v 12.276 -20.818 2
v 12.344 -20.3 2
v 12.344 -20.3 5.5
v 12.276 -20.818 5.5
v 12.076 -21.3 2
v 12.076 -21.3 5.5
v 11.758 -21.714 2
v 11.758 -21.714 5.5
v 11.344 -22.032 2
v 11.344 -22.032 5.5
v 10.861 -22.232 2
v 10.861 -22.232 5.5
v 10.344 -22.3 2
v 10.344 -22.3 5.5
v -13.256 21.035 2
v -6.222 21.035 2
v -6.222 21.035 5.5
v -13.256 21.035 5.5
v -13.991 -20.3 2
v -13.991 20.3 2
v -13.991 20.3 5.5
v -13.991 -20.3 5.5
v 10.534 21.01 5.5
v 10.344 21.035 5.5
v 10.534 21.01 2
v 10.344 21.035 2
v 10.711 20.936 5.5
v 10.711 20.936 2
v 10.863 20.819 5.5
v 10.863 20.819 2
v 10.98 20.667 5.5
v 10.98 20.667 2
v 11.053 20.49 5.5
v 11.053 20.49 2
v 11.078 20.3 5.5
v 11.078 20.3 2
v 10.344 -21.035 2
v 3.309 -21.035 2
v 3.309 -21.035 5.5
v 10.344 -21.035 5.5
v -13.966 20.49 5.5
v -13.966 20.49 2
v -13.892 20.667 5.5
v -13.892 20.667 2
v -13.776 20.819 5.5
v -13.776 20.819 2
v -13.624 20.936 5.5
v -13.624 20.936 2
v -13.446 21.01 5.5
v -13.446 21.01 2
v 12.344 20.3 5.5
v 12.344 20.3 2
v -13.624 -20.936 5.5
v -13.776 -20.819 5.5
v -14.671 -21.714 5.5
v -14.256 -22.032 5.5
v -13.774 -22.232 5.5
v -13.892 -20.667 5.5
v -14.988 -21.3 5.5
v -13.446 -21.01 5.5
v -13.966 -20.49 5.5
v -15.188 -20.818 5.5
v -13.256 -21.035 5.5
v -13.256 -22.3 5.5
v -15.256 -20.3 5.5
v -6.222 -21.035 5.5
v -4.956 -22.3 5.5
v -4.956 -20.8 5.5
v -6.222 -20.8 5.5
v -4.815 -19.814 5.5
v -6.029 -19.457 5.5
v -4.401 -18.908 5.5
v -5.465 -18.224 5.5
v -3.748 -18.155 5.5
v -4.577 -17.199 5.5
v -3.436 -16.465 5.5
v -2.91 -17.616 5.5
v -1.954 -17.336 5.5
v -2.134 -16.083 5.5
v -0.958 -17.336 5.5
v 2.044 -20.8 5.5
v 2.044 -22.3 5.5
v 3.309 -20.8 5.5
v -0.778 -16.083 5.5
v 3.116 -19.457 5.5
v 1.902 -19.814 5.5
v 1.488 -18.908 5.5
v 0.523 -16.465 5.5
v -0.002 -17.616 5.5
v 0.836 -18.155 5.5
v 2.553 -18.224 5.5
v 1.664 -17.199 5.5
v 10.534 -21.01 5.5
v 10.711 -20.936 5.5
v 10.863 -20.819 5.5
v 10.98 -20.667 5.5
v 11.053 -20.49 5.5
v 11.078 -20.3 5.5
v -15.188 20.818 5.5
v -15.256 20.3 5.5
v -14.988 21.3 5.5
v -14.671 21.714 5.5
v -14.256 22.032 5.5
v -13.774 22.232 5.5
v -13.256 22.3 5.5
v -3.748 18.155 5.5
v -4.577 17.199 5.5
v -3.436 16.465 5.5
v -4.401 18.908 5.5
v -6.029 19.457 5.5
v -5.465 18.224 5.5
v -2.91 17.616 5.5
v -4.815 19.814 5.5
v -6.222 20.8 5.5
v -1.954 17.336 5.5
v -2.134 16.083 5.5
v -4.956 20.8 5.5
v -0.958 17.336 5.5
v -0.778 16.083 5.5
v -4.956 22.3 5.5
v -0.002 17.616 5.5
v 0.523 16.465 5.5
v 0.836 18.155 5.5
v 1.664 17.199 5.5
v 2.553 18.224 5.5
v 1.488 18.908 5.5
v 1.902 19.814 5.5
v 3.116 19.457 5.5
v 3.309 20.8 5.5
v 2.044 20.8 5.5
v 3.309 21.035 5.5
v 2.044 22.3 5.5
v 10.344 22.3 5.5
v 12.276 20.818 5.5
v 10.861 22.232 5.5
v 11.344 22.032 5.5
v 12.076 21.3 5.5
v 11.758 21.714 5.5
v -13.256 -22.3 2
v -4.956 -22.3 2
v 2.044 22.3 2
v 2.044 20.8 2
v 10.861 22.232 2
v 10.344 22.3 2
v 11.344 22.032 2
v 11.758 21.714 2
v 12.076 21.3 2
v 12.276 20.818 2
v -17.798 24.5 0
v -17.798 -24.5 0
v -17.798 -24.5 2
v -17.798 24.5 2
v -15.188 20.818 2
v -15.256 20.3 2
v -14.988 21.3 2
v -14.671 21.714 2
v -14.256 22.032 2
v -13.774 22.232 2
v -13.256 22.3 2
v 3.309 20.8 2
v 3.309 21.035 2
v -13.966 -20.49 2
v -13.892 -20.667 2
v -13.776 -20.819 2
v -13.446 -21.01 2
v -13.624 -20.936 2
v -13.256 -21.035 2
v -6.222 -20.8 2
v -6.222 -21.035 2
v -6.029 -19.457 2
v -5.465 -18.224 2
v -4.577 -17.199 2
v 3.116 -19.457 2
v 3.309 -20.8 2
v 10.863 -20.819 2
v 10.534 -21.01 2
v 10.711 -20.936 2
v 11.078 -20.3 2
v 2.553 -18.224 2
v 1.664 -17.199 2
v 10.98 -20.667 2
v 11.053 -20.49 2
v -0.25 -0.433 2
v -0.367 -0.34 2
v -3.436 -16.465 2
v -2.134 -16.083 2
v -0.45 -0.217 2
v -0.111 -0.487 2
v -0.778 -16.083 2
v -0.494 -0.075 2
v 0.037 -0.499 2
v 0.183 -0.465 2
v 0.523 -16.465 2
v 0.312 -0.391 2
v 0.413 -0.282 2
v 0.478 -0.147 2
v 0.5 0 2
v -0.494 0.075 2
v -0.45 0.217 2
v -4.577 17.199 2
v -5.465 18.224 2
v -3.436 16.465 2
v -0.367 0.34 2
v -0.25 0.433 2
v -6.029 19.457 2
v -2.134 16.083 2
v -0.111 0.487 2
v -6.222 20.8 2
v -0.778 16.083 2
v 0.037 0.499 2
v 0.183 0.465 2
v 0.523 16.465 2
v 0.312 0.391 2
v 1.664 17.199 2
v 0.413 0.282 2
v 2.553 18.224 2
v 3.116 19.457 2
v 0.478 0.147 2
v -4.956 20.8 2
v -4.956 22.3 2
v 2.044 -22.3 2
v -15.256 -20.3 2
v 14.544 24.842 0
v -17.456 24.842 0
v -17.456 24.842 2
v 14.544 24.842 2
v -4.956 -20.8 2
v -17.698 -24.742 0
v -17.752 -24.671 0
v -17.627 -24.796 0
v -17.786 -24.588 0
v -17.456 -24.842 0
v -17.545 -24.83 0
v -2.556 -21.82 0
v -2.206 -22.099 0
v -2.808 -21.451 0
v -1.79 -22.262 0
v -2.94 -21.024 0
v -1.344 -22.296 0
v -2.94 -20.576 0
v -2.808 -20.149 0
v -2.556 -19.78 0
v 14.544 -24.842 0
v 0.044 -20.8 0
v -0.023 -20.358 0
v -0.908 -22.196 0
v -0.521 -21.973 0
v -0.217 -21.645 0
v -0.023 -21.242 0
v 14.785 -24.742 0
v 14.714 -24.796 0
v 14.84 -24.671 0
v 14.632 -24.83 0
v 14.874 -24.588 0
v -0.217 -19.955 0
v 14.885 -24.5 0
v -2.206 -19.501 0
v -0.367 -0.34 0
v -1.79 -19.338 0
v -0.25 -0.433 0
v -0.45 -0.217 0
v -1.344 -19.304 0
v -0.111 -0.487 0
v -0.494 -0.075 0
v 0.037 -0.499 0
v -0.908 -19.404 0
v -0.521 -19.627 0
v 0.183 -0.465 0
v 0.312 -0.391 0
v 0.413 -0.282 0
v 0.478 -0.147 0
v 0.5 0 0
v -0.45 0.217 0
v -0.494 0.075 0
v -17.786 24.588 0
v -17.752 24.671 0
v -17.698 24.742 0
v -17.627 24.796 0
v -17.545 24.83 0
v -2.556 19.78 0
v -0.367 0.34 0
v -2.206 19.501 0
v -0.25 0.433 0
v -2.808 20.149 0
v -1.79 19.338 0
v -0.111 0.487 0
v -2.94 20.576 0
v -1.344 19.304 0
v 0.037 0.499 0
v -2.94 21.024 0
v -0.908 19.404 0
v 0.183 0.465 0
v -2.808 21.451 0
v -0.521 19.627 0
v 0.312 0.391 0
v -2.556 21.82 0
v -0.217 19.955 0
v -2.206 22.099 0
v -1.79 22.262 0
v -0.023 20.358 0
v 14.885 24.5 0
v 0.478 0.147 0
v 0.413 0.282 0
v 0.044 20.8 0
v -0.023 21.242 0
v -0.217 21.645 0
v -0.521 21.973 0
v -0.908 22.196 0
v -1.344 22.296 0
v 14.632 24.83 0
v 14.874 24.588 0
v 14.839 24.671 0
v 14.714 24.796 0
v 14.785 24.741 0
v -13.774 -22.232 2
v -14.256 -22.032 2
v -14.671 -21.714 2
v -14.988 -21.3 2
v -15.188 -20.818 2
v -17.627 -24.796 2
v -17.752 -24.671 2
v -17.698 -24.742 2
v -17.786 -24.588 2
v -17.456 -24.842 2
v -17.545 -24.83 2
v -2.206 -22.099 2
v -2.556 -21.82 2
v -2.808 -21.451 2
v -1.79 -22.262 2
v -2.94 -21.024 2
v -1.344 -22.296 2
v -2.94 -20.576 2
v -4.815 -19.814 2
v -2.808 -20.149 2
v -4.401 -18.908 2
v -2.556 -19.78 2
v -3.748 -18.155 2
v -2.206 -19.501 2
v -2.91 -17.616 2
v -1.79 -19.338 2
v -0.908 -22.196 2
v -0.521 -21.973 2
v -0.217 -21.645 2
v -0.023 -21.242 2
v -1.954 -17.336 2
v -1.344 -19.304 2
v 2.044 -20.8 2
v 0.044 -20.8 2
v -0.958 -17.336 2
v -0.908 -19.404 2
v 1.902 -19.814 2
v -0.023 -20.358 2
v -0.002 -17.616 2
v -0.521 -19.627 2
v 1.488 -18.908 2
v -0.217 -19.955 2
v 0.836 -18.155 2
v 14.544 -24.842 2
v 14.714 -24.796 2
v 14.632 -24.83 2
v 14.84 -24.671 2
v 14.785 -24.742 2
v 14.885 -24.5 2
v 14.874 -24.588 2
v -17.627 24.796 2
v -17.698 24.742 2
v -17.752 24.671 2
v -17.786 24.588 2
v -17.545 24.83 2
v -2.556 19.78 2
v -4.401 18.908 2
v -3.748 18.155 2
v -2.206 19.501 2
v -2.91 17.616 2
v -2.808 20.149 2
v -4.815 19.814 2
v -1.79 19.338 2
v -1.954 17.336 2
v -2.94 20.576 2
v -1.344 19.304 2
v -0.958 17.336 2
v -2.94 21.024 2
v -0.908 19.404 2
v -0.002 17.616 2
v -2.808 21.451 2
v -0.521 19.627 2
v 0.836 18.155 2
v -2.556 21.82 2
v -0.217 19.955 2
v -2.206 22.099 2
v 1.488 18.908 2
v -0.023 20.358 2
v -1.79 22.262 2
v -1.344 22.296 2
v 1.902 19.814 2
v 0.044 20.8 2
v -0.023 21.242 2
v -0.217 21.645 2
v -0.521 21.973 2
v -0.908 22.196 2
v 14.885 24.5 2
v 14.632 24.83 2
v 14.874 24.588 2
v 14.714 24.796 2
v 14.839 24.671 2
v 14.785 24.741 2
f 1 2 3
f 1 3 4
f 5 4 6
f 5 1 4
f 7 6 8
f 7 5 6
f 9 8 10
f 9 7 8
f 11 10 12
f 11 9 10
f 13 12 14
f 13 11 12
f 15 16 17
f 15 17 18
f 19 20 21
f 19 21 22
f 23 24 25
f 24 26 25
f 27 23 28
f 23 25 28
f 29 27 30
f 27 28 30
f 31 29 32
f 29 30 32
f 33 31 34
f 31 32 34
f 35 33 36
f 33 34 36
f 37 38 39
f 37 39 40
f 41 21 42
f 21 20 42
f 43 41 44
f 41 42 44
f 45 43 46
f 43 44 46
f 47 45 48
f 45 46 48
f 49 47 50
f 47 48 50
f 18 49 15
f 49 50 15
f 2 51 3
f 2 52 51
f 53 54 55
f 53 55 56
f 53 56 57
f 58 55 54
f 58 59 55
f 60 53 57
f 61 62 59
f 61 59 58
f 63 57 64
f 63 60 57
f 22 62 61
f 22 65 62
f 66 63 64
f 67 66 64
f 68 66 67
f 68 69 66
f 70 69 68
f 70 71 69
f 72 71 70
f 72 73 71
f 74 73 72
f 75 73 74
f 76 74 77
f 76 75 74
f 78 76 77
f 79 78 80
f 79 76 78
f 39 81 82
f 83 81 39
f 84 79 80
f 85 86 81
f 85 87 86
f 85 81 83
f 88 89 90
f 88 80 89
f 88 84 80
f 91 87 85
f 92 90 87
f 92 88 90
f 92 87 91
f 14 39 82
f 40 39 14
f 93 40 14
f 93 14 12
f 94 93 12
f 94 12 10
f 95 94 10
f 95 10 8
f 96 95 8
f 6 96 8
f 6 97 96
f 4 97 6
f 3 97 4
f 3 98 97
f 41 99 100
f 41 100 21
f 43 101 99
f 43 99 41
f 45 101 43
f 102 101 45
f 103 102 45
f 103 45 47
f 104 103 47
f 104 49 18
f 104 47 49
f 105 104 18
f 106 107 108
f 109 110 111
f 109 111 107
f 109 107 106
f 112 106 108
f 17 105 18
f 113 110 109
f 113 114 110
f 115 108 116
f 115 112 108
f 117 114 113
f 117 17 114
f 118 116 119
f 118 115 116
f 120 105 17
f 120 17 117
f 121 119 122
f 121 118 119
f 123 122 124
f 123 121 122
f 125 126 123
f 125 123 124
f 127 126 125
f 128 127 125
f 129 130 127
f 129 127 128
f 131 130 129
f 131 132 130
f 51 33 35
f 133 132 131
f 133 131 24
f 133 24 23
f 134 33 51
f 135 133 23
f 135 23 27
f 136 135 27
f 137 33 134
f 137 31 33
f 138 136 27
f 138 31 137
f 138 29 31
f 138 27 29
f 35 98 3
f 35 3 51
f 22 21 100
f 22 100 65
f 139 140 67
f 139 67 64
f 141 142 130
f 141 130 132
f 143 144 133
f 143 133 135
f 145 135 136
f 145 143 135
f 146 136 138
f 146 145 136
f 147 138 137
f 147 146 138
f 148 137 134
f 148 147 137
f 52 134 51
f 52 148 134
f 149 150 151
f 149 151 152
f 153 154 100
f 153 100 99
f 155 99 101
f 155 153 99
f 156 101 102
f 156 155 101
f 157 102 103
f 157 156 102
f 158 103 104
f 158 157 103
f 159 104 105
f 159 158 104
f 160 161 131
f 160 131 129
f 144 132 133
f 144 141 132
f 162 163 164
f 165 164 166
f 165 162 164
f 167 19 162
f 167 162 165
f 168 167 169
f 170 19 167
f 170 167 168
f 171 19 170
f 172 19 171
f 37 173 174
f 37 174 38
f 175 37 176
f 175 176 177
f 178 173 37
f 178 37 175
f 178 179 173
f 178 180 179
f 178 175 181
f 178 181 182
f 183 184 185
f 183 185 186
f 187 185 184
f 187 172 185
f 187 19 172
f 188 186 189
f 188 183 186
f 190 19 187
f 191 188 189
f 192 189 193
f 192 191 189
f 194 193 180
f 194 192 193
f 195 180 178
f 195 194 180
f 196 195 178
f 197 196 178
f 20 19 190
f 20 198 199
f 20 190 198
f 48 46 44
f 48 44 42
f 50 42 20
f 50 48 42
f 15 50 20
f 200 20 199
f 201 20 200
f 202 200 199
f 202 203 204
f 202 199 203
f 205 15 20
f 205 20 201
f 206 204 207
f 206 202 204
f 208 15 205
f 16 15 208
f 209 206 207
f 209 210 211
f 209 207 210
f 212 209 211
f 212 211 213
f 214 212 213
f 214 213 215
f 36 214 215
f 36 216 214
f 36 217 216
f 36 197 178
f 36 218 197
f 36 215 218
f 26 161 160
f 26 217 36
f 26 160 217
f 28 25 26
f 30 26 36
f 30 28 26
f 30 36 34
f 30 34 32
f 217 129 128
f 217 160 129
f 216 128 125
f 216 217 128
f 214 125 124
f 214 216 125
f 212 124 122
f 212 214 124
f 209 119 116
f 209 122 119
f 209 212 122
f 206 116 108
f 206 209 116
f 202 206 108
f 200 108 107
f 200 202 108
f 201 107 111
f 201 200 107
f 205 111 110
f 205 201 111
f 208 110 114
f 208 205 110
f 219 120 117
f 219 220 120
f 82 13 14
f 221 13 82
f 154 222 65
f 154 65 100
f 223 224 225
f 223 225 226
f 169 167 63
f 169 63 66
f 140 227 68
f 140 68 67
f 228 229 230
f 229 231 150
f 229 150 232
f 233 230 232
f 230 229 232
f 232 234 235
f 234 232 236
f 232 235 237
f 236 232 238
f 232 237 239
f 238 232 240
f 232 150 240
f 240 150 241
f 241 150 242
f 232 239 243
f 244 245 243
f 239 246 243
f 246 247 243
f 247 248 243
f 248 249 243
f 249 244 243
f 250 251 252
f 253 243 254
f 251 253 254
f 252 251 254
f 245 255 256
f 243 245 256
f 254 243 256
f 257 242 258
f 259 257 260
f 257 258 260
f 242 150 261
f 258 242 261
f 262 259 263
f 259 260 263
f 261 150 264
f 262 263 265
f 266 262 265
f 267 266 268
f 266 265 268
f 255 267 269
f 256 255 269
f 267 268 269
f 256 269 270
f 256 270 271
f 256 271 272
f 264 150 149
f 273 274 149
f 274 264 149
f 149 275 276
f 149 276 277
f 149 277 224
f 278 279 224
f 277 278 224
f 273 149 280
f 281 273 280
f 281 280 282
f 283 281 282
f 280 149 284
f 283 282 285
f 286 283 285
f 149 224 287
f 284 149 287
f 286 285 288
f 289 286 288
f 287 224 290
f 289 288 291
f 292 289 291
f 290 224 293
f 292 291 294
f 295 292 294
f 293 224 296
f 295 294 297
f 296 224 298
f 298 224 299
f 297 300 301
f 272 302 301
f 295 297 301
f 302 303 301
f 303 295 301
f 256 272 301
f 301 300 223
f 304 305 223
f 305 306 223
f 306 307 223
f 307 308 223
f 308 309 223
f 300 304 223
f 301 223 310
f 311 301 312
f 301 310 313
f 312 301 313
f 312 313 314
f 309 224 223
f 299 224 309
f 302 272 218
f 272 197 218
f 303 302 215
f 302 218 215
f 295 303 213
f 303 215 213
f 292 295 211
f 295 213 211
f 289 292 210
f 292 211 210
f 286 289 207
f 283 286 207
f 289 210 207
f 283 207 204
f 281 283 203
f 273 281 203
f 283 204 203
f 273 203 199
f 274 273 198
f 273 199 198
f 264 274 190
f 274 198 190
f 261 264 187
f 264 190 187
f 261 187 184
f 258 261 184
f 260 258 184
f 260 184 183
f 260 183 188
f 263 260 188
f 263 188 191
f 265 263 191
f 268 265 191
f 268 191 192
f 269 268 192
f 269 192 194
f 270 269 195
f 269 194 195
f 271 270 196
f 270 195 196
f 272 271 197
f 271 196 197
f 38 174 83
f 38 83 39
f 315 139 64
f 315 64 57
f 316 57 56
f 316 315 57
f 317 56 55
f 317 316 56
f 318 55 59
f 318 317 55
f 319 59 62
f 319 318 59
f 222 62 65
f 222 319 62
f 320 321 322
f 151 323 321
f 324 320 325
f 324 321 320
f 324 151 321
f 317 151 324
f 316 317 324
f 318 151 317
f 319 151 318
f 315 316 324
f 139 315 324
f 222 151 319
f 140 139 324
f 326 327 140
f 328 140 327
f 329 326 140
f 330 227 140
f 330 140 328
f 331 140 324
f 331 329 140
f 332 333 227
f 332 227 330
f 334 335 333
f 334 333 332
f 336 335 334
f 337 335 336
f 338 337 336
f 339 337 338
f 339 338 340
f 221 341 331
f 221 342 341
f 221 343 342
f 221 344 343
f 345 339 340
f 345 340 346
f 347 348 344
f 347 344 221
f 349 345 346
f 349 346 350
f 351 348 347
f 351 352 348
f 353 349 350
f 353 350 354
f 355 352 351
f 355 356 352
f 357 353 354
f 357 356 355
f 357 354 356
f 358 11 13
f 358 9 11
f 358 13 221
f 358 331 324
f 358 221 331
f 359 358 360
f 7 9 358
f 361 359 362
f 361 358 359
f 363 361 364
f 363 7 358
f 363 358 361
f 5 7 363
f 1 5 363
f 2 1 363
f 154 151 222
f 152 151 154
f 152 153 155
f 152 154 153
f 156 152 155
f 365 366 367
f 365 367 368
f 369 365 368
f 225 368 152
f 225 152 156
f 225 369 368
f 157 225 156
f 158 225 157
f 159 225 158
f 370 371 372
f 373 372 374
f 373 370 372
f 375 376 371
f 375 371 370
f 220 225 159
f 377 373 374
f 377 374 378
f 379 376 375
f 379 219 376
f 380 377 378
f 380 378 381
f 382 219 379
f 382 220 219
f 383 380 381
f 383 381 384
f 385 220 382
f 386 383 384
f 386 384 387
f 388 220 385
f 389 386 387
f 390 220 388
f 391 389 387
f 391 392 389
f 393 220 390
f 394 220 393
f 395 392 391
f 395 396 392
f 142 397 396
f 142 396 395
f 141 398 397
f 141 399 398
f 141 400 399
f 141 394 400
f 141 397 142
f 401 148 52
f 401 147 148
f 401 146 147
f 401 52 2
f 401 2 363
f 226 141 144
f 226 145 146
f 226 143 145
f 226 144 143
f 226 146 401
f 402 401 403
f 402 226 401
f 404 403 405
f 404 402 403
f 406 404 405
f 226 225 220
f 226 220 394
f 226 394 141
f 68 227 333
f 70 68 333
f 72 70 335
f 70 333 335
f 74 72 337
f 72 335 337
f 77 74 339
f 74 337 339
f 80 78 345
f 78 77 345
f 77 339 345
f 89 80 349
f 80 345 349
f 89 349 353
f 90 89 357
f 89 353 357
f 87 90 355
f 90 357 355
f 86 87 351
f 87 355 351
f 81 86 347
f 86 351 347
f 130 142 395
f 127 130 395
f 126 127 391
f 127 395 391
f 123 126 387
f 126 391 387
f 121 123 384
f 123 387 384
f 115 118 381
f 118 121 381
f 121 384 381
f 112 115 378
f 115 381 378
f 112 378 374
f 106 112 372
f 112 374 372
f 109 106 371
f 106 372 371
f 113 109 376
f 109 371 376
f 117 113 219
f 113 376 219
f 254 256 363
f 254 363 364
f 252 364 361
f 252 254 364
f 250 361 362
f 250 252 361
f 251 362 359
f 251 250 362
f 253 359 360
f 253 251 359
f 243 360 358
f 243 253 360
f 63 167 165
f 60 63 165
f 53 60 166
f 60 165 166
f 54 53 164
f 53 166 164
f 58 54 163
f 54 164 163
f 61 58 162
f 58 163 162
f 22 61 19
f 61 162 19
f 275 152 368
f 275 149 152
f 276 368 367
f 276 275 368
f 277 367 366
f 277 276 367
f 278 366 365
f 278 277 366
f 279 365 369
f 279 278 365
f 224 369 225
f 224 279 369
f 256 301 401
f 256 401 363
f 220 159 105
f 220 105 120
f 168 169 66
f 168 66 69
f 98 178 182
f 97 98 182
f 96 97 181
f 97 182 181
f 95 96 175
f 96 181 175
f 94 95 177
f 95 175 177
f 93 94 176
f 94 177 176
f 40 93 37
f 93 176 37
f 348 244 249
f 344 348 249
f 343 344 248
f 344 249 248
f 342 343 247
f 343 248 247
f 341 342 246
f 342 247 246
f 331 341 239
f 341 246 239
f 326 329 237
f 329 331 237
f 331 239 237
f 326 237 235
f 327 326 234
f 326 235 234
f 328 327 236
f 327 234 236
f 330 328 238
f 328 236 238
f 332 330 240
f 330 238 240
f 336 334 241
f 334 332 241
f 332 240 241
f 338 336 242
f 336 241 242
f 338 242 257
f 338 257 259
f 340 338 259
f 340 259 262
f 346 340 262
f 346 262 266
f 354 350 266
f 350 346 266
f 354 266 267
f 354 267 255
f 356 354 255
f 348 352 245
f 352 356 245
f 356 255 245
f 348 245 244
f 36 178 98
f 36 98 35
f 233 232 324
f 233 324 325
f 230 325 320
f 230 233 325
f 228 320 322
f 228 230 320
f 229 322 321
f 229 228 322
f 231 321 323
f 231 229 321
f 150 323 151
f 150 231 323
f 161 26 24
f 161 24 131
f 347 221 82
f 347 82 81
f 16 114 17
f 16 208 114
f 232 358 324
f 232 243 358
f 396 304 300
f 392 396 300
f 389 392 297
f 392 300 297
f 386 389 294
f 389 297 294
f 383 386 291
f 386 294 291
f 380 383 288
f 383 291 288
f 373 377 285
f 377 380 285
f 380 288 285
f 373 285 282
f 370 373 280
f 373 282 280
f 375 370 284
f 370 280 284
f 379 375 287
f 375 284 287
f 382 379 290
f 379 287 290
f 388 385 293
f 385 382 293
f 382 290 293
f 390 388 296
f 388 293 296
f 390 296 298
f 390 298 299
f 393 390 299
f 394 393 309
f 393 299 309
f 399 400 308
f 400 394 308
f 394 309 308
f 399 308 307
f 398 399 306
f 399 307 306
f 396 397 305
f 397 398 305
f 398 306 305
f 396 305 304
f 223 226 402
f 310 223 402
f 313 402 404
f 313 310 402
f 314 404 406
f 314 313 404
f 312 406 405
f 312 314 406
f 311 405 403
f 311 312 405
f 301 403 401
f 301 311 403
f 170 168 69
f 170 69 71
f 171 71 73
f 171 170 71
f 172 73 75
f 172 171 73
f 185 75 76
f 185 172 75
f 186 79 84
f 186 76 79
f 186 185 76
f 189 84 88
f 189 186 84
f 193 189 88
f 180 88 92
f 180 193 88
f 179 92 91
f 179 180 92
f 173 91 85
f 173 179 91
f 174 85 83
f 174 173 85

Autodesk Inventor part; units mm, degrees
ref_plane "YZ Plane" through (0, 0, 0) normal (1, 0, 0) x (0, 1, 0)
ref_plane "XZ Plane" through (0, 0, 0) normal (0, 1, 0) x (-1, 0, 0)
ref_plane "XY Plane" through (0, 0, 0) normal (0, 0, 1) x (1, 0, 0)
sketch "Sketch1" plane through (0, 0, 0) normal (0, 0, 1) x (1, 0, 0)
  circle A0 centre (-1.4563, -20.8) radius 1.5
  circle A1 centre (-1.4563, 20.8) radius 1.5
  line L0 (14.8852, 24.5) -> (14.8852, -24.5)
  arc A2 (14.8852, 24.5) -> (14.5437, 24.8416) centre (14.5437, 24.5) ccw
  line L1 (-17.4563, 24.8416) -> (14.5437, 24.8416)
  arc A3 (-17.4563, 24.8416) -> (-17.7979, 24.5) centre (-17.4563, 24.5) ccw
  line L2 (-17.7979, -24.5) -> (-17.7979, 24.5)
  arc A4 (-17.7979, -24.5) -> (-17.4563, -24.8416) centre (-17.4563, -24.5) ccw
  line L3 (14.5437, -24.8416) -> (-17.4563, -24.8416)
  arc A5 (14.5437, -24.8416) -> (14.8852, -24.5) centre (14.5437, -24.5) ccw
  line L4 (-13.2563, 22.3) -> (-4.9563, 22.3)
  line L5 (-4.9563, 22.3) -> (-4.9563, 20.8)
  arc A6 (-4.9563, 20.8) -> (2.0437, 20.8) centre (-1.4563, 20.8) ccw
  line L6 (2.0437, 20.8) -> (2.0437, 22.3)
  line L7 (2.0437, 22.3) -> (10.3437, 22.3)
  arc A7 (12.3437, 20.3) -> (10.3437, 22.3) centre (10.3437, 20.3) ccw
  line L8 (12.3437, 20.3) -> (12.3437, -20.3)
  arc A8 (10.3437, -22.3) -> (12.3437, -20.3) centre (10.3437, -20.3) ccw
  line L9 (10.3437, -22.3) -> (2.0437, -22.3)
  line L10 (2.0437, -22.3) -> (2.0437, -20.8)
  arc A9 (2.0437, -20.8) -> (-4.9563, -20.8) centre (-1.4563, -20.8) ccw
  line L11 (-4.9563, -20.8) -> (-4.9563, -22.3)
  line L12 (-4.9563, -22.3) -> (-13.2563, -22.3)
  arc A10 (-15.2563, -20.3) -> (-13.2563, -22.3) centre (-13.2563, -20.3) ccw
  line L13 (-15.2563, -20.3) -> (-15.2563, 20.3)
  arc A11 (-13.2563, 22.3) -> (-15.2563, 20.3) centre (-13.2563, 20.3) ccw
  circle A12 centre (-1.4563, 20.8) radius 1.5
  circle A13 centre (-1.4563, -20.8) radius 1.5
  arc A14 (-17.4563, 26.5) -> (-19.4563, 24.5) centre (-17.4563, 24.5) ccw
  line L14 (-19.4563, -24.5) -> (-19.4563, 24.5)
  arc A15 (-19.4563, -24.5) -> (-17.4563, -26.5) centre (-17.4563, -24.5) ccw
  line L15 (14.5437, -26.5) -> (-17.4563, -26.5)
  arc A16 (14.5437, -26.5) -> (16.5437, -24.5) centre (14.5437, -24.5) ccw
  line L16 (16.5437, 24.5) -> (16.5437, -24.5)
  arc A17 (16.5437, 24.5) -> (14.5437, 26.5) centre (14.5437, 24.5) ccw
  line L17 (-17.4563, 26.5) -> (14.5437, 26.5)
  arc A18 (-6.2217, 20.8) -> (3.3091, 20.8) centre (-1.4563, 20.8) ccw
  line L18 (-6.2217, 20.8) -> (-6.2217, 21.0346)
  line L19 (-6.2217, 21.0346) -> (-13.2563, 21.0346)
  arc A19 (-13.2563, 21.0346) -> (-13.9909, 20.3) centre (-13.2563, 20.3) ccw
  line L20 (-13.9909, 20.3) -> (-13.9909, -20.3)
  arc A20 (-13.9909, -20.3) -> (-13.2563, -21.0346) centre (-13.2563, -20.3) ccw
  line L21 (-13.2563, -21.0346) -> (-6.2217, -21.0346)
  line L22 (-6.2217, -21.0346) -> (-6.2217, -20.8)
  arc A21 (3.3091, -20.8) -> (-6.2217, -20.8) centre (-1.4563, -20.8) ccw
  line L23 (3.3091, -20.8) -> (3.3091, -21.0346)
  line L24 (3.3091, -21.0346) -> (10.3437, -21.0346)
  arc A22 (10.3437, -21.0346) -> (11.0783, -20.3) centre (10.3437, -20.3) ccw
  line L25 (11.0783, -20.3) -> (11.0783, 20.3)
  arc A23 (11.0783, 20.3) -> (10.3437, 21.0346) centre (10.3437, 20.3) ccw
  line L26 (10.3437, 21.0346) -> (3.3091, 21.0346)
  line L27 (3.3091, 21.0346) -> (3.3091, 20.8)
  point P0 (0, 0)
  point P1 (0, 0)
  point P2 (0, 0)
extrude "Extrusion1" add sketch "Sketch1" along normal blind 2 contours L0 A5 L3 A4 L2 A3 L1 A2
extrude "Extrusion2" add sketch "Sketch1" along normal blind 5.5 contours L4 L5 A6 L6 L7 A7 L8 A8 L9 L10 A9 L11 L12 A10 L13 A11
extrude "Extrusion3" add sketch "Sketch1" along normal blind 2 contours A18 L27 L26 A23 L25 A22 L24 L23 A21 L22 L21 A20 L20 A19 L19 L18
sketch "Sketch2" plane through (0, 0, 2) normal (0, 0, 1) x (1, 0, 0)
  circle A0 centre (0, 0) radius 0.5
  dimension "d6" = 1
extrude "Extrusion4" cut sketch "Sketch2" along normal through all both and the other way through all
properties part number "Goma"
